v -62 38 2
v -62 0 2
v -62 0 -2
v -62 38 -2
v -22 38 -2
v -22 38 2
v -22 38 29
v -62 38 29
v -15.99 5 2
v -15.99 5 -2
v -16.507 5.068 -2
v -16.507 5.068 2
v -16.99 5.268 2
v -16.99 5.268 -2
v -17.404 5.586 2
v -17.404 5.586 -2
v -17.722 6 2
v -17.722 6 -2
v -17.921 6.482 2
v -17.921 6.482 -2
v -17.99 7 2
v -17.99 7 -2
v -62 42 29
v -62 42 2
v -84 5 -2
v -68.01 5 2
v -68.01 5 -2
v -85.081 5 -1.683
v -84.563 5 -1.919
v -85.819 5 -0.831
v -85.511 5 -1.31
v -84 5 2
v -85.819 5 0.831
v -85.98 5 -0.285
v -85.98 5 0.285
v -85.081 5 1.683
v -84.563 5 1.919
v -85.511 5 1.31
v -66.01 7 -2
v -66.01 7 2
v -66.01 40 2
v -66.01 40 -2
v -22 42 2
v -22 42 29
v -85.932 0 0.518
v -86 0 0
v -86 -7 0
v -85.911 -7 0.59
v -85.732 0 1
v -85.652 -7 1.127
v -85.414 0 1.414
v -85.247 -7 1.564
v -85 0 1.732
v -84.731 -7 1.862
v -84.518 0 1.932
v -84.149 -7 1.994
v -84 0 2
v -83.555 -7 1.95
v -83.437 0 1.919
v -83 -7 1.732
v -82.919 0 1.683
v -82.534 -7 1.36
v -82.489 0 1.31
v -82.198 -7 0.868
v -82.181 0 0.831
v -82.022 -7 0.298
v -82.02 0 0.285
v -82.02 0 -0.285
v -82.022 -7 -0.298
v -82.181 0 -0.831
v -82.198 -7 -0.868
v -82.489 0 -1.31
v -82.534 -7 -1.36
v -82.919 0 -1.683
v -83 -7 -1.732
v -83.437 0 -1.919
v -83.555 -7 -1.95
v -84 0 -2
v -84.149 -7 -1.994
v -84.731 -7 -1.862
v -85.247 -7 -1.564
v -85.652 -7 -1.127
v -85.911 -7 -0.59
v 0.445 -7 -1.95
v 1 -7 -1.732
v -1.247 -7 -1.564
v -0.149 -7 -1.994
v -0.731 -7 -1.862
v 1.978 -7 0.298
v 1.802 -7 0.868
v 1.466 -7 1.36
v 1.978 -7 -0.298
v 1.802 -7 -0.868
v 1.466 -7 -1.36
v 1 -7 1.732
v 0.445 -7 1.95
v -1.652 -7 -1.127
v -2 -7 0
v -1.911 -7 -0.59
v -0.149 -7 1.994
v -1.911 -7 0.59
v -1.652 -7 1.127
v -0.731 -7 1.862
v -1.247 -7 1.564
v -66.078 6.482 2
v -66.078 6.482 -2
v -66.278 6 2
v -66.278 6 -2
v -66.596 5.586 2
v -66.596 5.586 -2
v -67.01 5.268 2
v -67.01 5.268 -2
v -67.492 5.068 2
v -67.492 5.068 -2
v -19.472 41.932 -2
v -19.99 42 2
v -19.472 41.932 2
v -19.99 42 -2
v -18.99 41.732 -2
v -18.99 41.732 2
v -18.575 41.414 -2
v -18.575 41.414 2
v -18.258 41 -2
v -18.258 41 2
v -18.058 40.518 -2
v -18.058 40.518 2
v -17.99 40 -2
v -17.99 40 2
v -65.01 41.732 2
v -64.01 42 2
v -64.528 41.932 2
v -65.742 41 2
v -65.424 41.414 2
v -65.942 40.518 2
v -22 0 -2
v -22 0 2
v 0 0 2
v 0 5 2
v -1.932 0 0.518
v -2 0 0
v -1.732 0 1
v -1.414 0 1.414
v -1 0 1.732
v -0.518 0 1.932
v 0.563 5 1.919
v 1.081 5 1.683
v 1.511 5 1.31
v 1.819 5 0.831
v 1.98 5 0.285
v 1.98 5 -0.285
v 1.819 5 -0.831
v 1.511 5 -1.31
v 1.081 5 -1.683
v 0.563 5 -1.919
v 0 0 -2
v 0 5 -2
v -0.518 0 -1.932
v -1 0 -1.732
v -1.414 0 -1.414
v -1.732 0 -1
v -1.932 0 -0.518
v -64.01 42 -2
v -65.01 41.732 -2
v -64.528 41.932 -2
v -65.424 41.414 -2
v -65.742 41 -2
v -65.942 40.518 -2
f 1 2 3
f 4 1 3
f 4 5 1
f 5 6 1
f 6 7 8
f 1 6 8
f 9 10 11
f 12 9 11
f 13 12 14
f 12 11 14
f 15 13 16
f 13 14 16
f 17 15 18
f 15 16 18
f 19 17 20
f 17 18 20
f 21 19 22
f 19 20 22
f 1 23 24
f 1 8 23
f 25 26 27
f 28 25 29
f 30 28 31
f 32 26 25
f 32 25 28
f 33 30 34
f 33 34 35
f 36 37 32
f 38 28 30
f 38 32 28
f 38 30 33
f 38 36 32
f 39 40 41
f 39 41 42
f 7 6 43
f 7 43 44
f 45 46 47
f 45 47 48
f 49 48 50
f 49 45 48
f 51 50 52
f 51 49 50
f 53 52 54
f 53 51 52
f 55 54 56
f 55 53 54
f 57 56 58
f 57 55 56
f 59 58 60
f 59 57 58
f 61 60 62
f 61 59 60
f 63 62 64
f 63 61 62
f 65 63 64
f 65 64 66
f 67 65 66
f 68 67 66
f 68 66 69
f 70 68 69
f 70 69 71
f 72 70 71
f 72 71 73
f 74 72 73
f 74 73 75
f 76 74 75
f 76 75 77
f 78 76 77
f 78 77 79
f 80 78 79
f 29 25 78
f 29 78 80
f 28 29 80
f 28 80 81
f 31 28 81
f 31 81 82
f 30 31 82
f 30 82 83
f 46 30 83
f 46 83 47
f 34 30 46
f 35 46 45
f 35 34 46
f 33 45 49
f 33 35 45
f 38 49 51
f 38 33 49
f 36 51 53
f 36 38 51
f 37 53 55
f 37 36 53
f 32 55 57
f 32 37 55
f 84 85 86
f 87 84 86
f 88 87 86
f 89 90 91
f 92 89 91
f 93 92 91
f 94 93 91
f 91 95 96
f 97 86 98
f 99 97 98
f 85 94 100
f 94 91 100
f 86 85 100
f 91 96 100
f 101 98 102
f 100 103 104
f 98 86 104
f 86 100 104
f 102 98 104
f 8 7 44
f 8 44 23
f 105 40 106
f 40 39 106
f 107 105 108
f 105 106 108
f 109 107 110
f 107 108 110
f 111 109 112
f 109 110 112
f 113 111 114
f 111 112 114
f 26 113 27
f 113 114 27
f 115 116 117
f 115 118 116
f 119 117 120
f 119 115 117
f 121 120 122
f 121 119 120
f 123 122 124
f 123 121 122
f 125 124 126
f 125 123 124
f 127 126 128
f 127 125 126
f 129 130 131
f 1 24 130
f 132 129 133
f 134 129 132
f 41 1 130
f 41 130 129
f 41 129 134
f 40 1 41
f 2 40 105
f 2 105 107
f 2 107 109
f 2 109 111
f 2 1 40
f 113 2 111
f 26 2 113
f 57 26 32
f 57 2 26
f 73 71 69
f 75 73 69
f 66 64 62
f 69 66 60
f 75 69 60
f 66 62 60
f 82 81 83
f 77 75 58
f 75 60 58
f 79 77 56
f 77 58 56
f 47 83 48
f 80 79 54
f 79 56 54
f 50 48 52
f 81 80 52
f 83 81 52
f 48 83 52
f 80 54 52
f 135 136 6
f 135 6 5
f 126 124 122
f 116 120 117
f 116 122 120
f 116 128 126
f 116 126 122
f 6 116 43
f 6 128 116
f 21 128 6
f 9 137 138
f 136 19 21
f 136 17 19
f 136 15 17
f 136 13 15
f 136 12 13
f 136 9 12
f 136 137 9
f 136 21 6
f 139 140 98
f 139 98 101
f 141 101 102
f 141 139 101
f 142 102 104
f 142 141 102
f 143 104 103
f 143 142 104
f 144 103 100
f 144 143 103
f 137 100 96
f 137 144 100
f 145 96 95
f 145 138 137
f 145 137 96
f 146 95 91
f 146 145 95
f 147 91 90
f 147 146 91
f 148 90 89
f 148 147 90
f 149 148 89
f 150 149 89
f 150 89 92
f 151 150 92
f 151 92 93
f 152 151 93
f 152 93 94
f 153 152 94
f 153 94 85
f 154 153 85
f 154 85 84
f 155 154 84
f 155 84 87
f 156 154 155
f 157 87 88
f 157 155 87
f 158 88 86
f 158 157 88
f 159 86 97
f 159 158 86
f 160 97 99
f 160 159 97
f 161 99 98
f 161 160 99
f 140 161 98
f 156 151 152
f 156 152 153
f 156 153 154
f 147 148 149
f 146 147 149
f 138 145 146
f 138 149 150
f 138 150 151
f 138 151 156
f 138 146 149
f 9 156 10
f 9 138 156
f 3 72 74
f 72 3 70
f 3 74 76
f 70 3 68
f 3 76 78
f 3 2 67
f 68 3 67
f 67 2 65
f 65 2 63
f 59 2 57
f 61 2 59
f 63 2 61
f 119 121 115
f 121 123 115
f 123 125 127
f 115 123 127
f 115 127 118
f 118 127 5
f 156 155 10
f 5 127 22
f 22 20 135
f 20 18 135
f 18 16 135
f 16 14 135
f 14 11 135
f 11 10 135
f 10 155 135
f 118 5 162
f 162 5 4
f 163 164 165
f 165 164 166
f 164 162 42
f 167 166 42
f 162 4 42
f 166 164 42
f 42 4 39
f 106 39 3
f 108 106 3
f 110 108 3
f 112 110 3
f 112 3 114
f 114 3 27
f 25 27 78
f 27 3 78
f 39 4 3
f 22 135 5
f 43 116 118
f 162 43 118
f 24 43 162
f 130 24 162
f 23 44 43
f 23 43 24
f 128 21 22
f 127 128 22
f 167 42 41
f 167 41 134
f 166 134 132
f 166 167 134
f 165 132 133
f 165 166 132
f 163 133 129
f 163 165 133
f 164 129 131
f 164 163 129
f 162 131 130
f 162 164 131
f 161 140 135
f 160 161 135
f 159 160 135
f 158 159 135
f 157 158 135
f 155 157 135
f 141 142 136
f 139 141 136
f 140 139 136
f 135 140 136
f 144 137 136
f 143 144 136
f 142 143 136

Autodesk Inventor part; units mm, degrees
ref_plane "YZ Plane" through (0, 0, 0) normal (1, 0, 0) x (0, 1, 0)
ref_plane "XZ Plane" through (0, 0, 0) normal (0, 1, 0) x (-1, 0, 0)
ref_plane "XY Plane" through (0, 0, 0) normal (0, 0, 1) x (1, 0, 0)
sketch "Sketch1" plane through (0, 0, 0) normal (0, 1, 0) x (-1, 0, 0)
  circle A0 centre (0, 0) radius 2
  line L0 (0, 2) -> (22, 2)
  line L1 (22, 2) -> (22, -2)
  line L2 (22, 2) -> (22, 29)
  line L3 (22, 29) -> (62, 29)
  line L4 (22, -2) -> (62, -2)
  line L5 (62, 29) -> (62, -2)
  line L6 (17.9896, 2) -> (17.9896, -2)
  line L7 (62, -2) -> (62, 2)
  line L8 (22, -2) -> (0, -2)
  line L9 (62, 2) -> (84, 2)
  line L10 (62, -2) -> (84, -2)
  circle A1 centre (84, 0) radius 2
  line L11 (66.01, 2) -> (66.01, -2)
  line L12 (66.01, 2) -> (62, 2)
  line L13 (62, -2) -> (66.01, -2)
  line L14 (17.9896, 2) -> (22, 2)
  line L15 (22, -2) -> (17.9896, -2)
  line L16 (66.01, 2) -> (66.01, -2)
  line L17 (62, -2) -> (62, 2)
  line L18 (17.9896, -2) -> (17.9896, 2)
  line L19 (22, 2) -> (22, -2)
  line L20 (66.01, 2) -> (66.01, -2)
  line L21 (62, -2) -> (62, 2)
  line L22 (22, -2) -> (22, 2)
  line L23 (22, -2) -> (22, 2)
  line L24 (22, 2) -> (22, -2)
  line L25 (17.9896, -2) -> (17.9896, 2)
  line L26 (62, 2) -> (66.01, 2)
  line L27 (66.01, -2) -> (62, -2)
  line L28 (22, 2) -> (22, -2)
  line L29 (17.9896, -2) -> (17.9896, 2)
  line L30 (22, 2) -> (17.9896, 2)
  line L31 (22, -2) -> (17.9896, -2)
  line L32 (66.01, 2) -> (62, 2)
  line L33 (62, -2) -> (62, 2)
  line L34 (66.01, -2) -> (62, -2)
  line L35 (66.01, 2) -> (66.01, -2)
  dimension "d0" = 4
  dimension "d8" = 4
  dimension "d9" = 22
  dimension "d13" = 4
  dimension "d16" = 4.01
extrude "Extrusion1" add sketch "Sketch1" against normal blind 7 contours A0 | A1
extrude "Extrusion2" add sketch "Sketch1" along normal blind 5 contours A0 | A0 L0 L6 L8 | L11 L9 A1 L10 | A1
sketch "Sketch2" plane through (0, 5, 0) normal (0, 1, 0) x (1, 0, 0)
  point P0 (0, 0)
extrude "Extrusion3" add sketch "Sketch1" along normal blind 42 contours L0 L1 L8 L6 | L5 L9 L11 L10
extrude "Extrusion4" add sketch "Sketch1" along normal blind 42 contours L2 L3 L5 L4 L1
extrude "Extrusion5" cut sketch "Sketch1" along normal blind 38 contours L2 L3 L5 L4 L1
fillet "Fillet1" radius 2 4 edges at (-66.01, 5, 0) (-66.01, 42, 0) (-17.9896, 42, 0) (-17.9896, 5, 0)
properties part number "recubrimiento de motor"
